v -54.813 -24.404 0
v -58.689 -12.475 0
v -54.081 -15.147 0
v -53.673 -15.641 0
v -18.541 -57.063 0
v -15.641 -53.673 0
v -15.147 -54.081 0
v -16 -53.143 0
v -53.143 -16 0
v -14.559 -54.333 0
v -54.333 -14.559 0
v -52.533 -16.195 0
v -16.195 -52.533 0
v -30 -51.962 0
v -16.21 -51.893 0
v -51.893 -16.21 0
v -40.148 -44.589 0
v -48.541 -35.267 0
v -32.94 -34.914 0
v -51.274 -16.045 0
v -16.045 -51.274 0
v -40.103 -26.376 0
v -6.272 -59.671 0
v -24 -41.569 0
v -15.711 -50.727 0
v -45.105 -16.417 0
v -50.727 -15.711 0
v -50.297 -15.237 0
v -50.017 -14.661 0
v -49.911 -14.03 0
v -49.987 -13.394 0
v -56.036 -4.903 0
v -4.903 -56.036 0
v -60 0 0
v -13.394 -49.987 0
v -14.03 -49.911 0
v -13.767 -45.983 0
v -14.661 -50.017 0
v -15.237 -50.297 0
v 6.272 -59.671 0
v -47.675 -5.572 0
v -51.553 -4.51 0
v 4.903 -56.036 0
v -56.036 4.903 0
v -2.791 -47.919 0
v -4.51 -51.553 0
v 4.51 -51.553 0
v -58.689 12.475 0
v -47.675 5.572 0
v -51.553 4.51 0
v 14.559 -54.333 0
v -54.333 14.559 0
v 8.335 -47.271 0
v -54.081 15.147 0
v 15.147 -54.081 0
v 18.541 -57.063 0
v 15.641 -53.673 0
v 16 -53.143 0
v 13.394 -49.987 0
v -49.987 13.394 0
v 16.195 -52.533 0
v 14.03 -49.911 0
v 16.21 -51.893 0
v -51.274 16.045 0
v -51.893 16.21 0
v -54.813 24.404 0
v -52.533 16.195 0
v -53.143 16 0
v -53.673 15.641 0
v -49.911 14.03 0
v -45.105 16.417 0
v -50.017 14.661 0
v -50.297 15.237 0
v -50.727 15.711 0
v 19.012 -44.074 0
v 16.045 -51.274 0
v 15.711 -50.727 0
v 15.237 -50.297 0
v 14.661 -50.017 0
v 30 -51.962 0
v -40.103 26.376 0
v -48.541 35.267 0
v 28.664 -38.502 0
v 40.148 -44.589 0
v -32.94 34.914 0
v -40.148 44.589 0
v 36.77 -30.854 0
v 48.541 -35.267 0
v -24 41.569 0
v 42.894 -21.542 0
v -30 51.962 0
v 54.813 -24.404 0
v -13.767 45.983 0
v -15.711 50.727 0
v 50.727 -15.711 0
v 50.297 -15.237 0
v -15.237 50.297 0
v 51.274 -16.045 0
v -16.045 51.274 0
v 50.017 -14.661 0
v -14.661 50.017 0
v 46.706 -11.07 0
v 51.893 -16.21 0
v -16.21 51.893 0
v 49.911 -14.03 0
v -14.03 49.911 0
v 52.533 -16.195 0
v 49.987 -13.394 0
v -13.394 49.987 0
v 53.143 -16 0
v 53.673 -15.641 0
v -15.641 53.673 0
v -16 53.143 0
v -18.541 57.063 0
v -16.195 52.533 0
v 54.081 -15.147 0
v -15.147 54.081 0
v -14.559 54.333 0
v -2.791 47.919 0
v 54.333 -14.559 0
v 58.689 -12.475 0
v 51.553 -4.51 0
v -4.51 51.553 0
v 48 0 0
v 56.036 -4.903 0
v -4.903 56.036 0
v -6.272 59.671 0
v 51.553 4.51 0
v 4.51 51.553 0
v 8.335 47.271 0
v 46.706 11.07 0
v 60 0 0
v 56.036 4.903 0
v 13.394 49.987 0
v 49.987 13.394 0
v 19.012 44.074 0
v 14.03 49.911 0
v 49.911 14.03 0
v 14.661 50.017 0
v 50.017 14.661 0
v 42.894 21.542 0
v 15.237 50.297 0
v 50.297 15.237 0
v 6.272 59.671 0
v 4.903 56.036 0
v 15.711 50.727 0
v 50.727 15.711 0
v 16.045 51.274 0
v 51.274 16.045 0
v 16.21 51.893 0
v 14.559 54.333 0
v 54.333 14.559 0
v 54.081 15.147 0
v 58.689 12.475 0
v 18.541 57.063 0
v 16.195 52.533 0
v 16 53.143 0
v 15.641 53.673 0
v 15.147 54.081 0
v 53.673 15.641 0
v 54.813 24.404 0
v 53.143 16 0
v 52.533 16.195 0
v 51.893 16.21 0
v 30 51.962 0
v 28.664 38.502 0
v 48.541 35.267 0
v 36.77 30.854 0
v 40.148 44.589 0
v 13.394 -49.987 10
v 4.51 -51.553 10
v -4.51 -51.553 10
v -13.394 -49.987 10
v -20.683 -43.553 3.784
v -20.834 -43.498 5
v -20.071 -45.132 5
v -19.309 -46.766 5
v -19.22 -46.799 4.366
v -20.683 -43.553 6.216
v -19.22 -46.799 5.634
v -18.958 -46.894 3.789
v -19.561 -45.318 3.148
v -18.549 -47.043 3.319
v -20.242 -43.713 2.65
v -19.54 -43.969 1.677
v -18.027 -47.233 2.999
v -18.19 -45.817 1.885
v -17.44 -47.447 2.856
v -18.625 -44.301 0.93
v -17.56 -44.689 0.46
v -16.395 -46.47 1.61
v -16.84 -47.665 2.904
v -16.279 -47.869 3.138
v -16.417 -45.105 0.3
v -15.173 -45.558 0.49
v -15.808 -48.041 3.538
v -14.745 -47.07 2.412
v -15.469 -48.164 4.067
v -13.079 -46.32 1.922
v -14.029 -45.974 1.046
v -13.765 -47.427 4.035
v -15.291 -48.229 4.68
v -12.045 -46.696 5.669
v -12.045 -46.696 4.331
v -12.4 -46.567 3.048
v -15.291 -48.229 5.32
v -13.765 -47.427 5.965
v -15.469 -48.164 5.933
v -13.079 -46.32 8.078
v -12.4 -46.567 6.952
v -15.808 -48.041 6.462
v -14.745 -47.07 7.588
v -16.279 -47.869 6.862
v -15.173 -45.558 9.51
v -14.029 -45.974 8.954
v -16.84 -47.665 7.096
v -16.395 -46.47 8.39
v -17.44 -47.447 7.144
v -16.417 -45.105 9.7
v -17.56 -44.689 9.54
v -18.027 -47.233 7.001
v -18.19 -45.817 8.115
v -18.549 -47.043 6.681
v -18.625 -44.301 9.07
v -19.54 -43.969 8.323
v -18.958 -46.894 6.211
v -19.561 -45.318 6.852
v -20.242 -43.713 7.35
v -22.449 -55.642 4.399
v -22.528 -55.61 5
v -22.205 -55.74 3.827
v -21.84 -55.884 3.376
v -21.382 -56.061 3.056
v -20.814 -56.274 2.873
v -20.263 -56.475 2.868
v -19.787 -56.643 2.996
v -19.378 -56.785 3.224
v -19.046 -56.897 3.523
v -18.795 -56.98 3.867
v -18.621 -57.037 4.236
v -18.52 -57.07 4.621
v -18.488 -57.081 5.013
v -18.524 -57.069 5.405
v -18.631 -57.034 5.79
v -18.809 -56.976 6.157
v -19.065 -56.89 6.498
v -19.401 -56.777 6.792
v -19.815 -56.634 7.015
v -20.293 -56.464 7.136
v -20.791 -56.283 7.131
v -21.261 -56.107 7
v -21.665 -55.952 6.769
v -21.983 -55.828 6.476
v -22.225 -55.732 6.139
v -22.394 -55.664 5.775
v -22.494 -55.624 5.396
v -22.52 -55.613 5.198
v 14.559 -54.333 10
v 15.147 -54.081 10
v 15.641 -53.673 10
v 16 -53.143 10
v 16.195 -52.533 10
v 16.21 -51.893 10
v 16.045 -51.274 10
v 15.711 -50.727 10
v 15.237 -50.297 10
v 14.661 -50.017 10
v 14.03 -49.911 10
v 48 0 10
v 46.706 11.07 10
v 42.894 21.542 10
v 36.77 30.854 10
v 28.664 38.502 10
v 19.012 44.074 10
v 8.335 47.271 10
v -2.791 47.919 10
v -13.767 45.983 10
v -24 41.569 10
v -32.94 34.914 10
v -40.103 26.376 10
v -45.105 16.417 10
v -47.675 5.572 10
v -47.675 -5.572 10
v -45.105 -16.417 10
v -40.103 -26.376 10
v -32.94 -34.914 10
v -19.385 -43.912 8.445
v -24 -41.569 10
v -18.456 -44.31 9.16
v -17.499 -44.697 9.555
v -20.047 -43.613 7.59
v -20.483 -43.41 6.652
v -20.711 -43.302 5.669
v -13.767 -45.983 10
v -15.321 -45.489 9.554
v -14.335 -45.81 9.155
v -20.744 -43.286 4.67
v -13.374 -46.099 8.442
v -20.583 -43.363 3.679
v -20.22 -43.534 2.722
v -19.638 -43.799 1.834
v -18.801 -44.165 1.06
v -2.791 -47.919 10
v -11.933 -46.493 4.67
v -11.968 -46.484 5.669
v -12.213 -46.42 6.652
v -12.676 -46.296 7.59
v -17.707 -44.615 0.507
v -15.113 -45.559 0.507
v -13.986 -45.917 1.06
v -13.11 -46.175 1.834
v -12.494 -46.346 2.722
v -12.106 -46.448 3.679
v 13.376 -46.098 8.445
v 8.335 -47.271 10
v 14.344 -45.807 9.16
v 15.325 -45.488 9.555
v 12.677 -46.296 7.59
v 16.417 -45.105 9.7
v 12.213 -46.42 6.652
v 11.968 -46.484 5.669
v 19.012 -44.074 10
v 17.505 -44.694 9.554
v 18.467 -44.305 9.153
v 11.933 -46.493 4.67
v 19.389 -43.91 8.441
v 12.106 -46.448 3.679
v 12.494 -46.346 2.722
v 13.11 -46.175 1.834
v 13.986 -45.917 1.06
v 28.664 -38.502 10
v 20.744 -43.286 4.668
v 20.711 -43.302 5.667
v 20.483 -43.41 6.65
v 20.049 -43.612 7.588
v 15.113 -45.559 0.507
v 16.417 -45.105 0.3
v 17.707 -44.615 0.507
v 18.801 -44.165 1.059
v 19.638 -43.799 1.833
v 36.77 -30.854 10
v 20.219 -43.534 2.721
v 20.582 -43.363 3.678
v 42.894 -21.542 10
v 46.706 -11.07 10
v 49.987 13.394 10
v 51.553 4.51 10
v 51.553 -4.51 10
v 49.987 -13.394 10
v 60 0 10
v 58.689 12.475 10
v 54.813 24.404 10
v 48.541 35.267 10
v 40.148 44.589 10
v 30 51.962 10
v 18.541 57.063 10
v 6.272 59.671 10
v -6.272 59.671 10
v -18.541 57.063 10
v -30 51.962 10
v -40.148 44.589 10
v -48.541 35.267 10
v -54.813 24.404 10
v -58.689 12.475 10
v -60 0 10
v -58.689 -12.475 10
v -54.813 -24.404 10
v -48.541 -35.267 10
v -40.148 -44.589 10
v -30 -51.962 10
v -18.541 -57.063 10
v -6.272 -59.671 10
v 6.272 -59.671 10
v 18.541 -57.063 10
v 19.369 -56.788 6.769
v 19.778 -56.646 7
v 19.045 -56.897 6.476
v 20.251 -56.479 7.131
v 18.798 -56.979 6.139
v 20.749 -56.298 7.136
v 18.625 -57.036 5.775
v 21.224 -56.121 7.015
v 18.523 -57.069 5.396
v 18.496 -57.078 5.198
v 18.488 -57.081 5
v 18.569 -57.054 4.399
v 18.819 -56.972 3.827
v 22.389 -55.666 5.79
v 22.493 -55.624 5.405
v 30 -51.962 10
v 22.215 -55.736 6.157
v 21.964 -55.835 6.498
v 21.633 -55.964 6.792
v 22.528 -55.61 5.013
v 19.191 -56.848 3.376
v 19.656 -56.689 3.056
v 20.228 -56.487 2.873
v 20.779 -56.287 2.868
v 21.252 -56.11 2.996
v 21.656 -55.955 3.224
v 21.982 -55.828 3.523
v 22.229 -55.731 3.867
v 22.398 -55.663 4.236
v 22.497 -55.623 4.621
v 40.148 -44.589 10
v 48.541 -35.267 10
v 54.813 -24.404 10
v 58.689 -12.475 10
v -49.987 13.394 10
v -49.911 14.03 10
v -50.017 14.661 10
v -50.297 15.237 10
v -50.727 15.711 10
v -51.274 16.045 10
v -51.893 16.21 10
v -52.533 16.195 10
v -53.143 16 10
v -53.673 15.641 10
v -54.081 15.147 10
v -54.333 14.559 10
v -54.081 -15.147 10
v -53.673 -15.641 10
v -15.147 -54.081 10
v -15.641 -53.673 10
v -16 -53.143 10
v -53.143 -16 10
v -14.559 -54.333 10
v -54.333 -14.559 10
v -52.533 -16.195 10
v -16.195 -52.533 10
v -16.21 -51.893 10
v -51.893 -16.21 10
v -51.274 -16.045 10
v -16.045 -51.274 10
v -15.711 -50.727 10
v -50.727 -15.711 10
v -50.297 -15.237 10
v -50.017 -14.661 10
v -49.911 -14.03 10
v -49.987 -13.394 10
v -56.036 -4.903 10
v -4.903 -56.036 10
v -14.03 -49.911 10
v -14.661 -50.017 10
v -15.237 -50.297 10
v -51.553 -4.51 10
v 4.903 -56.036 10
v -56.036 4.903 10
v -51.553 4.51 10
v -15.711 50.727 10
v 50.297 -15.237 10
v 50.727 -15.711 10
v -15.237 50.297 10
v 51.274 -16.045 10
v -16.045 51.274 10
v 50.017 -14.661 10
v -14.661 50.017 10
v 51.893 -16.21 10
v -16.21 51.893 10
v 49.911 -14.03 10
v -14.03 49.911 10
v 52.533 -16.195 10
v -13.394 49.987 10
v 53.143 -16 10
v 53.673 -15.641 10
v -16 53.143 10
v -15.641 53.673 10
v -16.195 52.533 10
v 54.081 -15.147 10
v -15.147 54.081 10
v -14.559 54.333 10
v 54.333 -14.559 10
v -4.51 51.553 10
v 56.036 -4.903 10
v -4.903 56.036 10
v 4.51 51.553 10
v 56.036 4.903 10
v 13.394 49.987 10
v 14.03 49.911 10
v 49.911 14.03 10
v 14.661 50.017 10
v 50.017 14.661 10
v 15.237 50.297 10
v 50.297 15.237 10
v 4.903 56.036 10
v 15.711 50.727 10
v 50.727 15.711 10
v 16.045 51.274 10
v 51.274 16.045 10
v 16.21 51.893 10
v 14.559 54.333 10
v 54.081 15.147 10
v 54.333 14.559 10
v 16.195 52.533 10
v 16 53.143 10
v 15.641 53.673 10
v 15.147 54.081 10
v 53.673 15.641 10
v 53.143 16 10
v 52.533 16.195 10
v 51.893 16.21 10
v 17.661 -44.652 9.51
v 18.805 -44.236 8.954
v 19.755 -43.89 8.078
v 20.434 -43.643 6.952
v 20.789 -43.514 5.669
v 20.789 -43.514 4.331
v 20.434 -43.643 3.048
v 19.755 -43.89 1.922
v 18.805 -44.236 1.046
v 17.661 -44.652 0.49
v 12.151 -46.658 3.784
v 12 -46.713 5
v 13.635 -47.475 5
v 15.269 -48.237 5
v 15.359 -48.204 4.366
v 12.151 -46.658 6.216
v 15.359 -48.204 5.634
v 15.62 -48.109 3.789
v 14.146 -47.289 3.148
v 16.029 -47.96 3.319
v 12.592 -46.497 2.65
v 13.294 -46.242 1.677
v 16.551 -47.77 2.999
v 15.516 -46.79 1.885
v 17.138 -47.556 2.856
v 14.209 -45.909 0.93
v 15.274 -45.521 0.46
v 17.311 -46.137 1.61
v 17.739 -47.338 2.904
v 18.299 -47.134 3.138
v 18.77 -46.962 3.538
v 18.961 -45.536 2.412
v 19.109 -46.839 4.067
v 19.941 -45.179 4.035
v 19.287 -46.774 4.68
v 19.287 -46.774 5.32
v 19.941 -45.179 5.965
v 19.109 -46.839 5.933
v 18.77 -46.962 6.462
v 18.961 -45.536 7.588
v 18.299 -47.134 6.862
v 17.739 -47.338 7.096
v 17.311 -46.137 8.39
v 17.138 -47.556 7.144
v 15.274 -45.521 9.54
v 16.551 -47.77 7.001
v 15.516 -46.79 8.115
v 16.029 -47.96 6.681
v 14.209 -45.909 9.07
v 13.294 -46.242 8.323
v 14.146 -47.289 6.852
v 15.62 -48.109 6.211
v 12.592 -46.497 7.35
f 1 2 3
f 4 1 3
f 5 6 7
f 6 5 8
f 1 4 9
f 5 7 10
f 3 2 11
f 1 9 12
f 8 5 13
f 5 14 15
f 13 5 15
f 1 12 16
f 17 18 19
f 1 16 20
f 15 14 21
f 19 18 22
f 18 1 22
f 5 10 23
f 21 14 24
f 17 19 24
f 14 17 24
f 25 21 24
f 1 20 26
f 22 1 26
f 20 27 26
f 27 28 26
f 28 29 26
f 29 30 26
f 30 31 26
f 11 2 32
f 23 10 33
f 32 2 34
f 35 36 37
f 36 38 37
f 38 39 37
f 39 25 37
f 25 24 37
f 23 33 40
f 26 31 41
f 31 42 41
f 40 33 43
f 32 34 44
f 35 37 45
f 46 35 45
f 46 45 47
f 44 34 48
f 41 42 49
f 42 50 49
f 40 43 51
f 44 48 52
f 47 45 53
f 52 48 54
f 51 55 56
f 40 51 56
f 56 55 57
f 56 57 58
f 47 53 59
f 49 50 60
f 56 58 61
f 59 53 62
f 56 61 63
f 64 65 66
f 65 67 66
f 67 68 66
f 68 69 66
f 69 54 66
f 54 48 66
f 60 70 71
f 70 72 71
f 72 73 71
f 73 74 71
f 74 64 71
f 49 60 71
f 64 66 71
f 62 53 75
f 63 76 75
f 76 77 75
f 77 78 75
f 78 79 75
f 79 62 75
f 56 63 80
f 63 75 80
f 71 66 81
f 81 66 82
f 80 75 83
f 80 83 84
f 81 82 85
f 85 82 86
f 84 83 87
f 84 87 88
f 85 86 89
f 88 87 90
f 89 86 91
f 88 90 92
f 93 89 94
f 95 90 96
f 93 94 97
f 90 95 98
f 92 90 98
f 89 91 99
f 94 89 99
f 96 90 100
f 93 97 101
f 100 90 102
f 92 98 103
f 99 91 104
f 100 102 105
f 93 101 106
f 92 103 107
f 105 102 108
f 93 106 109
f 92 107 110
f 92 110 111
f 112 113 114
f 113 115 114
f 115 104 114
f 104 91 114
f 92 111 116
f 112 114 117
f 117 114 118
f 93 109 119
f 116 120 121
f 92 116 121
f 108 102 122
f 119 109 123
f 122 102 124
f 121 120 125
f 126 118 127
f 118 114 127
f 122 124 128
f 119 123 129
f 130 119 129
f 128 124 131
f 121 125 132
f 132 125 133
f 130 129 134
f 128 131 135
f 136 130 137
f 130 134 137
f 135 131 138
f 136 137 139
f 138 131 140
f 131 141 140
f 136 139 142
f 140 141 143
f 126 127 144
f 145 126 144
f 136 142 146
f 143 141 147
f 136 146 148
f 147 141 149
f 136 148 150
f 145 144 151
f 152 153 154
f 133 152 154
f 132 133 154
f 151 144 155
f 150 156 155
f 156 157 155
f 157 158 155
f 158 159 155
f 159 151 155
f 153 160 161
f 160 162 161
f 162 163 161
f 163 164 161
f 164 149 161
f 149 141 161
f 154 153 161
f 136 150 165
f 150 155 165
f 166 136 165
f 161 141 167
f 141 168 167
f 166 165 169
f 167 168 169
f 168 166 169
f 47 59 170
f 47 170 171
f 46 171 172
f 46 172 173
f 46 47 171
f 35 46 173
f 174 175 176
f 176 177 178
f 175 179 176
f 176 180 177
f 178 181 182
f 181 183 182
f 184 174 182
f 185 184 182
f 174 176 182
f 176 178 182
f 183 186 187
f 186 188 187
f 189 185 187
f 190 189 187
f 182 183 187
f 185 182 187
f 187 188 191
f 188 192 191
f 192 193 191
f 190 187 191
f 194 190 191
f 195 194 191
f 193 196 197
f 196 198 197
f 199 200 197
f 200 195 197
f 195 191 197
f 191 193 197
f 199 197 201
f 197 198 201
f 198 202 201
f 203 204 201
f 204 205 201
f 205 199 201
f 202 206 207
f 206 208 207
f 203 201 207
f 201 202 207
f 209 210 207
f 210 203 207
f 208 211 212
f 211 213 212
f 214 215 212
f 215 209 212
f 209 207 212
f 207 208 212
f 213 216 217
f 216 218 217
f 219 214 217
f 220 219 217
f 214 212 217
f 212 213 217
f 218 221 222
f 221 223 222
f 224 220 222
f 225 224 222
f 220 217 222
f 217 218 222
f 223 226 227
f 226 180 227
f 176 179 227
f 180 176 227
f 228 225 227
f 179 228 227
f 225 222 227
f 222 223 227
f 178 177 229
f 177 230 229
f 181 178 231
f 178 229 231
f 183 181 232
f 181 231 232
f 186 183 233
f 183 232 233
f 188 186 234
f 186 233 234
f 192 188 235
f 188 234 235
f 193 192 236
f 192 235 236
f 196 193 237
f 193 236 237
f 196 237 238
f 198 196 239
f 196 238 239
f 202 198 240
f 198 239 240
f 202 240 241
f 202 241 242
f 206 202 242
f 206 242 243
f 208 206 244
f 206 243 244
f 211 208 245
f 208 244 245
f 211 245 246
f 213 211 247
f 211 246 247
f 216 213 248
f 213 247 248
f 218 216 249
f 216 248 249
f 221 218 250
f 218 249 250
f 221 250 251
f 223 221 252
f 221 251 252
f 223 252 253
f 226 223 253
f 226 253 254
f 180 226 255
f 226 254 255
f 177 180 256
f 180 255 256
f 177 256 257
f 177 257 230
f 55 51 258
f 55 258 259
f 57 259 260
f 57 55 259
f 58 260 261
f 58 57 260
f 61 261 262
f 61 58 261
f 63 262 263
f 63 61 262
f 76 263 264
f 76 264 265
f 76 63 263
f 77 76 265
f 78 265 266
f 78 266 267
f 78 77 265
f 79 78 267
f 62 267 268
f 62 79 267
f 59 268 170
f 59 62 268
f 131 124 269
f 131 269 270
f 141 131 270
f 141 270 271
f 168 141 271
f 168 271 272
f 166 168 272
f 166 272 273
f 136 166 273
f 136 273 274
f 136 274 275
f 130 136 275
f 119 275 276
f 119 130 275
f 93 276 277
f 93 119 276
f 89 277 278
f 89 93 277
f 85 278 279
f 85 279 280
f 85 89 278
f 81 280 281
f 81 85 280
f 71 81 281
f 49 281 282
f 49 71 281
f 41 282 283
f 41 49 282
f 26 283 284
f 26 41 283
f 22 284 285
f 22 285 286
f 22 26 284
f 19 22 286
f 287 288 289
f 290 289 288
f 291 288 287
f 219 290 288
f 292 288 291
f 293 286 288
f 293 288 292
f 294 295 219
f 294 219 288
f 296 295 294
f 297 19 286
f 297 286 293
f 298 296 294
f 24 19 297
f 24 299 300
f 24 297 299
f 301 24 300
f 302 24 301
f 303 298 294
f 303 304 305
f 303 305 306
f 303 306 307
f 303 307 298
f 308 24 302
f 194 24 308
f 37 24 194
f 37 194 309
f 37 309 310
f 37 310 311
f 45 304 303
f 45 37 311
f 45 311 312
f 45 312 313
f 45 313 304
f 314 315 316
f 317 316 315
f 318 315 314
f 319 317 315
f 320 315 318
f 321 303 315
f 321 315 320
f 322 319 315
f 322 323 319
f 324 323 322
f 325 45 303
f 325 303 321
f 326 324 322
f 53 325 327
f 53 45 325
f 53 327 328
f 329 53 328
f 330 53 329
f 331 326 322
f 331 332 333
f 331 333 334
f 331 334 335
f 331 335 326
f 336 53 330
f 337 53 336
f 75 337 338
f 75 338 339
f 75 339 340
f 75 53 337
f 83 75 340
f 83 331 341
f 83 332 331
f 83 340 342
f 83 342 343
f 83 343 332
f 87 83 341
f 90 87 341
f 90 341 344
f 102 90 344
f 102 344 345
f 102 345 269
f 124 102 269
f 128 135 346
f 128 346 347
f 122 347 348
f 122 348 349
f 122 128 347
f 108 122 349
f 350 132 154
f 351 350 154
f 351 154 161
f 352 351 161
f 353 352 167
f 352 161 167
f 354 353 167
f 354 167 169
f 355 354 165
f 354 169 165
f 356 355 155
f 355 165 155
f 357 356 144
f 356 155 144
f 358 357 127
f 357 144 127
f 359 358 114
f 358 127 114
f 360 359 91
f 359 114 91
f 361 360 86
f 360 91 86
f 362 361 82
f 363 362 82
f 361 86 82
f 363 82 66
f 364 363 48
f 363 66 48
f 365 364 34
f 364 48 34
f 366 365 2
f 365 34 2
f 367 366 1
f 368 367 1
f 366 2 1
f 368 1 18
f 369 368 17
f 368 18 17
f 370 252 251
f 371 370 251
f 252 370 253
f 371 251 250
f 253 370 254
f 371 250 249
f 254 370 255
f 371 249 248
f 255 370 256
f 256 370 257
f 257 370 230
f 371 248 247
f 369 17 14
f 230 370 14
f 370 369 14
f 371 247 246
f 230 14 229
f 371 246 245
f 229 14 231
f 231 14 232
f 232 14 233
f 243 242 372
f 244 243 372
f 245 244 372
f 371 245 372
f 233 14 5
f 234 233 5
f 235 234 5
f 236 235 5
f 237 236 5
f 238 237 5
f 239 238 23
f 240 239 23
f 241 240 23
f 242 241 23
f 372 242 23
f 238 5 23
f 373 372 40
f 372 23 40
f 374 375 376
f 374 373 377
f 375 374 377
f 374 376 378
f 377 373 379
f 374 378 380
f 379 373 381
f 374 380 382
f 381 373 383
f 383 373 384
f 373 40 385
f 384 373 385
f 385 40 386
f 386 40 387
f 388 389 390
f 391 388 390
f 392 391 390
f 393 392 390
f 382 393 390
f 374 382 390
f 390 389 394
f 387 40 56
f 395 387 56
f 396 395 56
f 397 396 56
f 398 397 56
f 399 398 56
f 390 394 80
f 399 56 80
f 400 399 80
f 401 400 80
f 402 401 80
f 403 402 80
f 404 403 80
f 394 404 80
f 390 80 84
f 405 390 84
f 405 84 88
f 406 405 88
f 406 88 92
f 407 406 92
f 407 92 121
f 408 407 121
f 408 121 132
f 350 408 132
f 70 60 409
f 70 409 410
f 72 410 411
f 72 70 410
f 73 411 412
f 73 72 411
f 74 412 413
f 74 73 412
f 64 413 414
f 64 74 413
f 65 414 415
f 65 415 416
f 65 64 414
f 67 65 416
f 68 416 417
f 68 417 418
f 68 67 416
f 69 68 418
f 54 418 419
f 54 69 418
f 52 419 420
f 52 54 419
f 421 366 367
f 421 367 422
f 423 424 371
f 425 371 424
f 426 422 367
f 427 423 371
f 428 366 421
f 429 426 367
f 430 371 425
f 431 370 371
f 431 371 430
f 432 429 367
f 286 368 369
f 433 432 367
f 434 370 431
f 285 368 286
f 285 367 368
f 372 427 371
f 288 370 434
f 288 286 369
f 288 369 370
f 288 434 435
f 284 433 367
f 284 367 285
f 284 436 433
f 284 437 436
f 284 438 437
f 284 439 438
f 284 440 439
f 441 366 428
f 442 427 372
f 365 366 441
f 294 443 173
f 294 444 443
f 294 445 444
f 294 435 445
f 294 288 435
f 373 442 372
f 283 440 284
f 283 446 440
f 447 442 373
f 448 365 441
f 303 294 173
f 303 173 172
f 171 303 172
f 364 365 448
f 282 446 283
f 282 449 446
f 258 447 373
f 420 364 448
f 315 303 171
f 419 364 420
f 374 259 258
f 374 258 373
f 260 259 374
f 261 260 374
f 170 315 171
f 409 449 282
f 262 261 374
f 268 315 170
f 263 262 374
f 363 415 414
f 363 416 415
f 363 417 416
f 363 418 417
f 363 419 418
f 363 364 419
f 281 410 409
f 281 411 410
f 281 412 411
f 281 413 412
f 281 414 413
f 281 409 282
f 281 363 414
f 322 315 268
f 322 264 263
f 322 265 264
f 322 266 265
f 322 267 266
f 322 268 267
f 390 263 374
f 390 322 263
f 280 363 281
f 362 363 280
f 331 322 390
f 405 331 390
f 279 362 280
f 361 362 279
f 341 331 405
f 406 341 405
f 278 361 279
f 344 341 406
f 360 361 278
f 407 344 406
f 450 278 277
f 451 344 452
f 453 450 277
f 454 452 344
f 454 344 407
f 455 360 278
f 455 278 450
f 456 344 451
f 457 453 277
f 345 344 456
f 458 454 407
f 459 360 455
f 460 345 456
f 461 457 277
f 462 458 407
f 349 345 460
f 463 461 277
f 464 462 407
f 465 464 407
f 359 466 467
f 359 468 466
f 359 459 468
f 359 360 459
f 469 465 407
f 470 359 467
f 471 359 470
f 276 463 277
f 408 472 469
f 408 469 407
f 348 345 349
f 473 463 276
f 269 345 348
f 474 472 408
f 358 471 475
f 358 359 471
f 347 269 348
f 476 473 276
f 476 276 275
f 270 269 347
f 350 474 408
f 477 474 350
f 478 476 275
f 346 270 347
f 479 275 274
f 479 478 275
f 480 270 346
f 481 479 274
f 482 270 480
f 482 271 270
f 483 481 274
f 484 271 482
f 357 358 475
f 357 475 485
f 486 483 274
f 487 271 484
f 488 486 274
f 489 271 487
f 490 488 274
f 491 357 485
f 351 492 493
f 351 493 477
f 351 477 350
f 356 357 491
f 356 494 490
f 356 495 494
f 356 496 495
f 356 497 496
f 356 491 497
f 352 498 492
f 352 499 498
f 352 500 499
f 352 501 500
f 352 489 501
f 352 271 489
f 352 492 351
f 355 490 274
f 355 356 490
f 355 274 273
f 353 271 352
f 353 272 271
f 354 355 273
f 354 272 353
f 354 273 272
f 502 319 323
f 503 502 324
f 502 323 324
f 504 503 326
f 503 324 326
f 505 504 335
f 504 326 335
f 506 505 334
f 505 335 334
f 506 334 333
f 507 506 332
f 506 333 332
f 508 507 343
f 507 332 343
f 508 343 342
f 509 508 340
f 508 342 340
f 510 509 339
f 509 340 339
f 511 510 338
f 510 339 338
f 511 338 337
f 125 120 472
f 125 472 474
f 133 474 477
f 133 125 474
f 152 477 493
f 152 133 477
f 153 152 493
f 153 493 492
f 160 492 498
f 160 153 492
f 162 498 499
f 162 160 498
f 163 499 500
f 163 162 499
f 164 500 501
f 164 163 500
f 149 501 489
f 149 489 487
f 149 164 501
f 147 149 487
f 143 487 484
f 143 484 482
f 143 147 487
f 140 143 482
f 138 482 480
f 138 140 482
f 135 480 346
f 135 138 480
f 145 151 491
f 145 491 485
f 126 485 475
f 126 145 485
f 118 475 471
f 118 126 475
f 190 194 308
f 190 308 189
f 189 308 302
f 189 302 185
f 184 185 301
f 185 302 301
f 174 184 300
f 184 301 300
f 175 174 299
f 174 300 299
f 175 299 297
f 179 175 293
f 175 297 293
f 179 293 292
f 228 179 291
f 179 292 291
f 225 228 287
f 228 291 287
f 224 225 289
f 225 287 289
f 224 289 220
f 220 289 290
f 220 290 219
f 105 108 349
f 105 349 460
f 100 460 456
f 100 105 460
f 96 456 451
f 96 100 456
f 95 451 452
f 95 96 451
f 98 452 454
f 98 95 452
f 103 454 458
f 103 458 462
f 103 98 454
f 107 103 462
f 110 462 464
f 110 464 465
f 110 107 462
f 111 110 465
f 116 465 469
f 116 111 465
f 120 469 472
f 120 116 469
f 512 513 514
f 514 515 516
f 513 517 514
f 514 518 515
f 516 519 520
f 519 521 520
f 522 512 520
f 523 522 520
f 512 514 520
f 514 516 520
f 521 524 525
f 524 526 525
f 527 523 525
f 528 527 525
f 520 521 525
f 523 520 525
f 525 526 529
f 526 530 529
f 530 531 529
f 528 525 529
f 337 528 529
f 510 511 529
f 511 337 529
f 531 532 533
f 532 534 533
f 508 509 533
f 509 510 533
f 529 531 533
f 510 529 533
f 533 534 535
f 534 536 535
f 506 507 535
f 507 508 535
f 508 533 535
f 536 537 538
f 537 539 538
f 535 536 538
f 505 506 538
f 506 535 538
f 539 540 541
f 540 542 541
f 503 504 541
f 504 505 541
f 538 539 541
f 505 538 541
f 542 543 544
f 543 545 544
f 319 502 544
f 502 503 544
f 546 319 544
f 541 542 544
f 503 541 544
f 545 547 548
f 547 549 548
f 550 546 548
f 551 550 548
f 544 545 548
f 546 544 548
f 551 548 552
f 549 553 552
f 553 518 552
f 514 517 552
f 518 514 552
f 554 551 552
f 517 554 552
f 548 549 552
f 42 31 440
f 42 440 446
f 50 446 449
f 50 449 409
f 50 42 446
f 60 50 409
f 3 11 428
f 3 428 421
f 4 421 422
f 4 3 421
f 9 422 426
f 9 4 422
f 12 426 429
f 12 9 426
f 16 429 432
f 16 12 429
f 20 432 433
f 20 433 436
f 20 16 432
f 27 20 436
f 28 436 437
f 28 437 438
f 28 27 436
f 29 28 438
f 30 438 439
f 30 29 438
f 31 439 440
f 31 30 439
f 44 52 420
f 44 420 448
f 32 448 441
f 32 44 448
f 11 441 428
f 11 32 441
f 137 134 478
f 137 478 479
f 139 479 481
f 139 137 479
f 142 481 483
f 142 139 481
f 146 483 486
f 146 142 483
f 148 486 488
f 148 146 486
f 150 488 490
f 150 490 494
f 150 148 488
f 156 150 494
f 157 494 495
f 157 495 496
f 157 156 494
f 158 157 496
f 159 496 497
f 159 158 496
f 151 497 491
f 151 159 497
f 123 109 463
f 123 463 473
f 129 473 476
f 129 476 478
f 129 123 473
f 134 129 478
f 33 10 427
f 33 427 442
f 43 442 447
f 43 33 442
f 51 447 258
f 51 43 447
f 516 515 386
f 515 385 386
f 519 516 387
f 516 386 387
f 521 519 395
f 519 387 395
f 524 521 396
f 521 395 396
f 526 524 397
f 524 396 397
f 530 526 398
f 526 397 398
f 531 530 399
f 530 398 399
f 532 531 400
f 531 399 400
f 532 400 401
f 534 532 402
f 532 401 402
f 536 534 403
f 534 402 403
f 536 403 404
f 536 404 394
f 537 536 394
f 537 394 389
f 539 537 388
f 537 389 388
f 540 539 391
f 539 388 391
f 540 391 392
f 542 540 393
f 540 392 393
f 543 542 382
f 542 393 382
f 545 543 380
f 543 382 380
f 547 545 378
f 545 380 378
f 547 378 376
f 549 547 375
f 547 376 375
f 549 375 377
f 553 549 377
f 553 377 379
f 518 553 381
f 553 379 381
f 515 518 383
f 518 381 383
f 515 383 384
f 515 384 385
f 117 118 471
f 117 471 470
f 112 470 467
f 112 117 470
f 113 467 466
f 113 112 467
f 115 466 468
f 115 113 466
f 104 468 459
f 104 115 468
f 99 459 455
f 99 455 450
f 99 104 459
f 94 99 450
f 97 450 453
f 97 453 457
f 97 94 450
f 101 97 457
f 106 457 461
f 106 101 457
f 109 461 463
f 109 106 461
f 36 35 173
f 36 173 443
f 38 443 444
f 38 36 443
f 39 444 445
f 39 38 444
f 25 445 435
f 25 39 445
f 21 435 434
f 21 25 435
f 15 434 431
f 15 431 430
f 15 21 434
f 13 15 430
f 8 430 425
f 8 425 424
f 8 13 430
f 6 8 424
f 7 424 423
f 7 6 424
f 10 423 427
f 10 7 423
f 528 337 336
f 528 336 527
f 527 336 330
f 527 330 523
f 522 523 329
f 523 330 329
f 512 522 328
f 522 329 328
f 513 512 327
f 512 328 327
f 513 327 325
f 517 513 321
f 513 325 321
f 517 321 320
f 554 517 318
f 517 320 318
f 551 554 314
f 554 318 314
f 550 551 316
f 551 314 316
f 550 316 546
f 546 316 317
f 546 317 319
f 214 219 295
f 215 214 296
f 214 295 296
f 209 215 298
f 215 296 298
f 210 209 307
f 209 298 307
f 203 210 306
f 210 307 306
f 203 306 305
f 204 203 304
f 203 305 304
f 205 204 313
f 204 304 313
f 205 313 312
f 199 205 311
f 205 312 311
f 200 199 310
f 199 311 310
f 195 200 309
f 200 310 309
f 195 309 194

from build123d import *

# Parameters (mm, degrees)
SCHIZZO2_R                                       = 60
SCHIZZO2_R_2                                     = 48
ESTRUSIONE_ESTRUSIONE1_DEPTH                     = 10
FORO_SVASATO_PER_VITE_M4_1_D                     = 4.3
FORO_SVASATO_PER_VITE_M4_1_DEPTH                 = 28.902765847
FORO_SVASATO_PER_VITE_M4_1_CSINK_D               = 9.4
FORO_SVASATO_PER_VITE_M4_1_CSINK_ANGLE           = 90
FORO_SVASATO_PER_VITE_M4_1_ON_FACE_2_D           = 4.3
FORO_SVASATO_PER_VITE_M4_1_ON_FACE_2_DEPTH       = 28.902765847
FORO_SVASATO_PER_VITE_M4_1_ON_FACE_2_CSINK_D     = 9.4
FORO_SVASATO_PER_VITE_M4_1_ON_FACE_2_CSINK_ANGLE = 90


with BuildPart() as part:
    # Schizzo2 → Estrusione-Estrusione1 (new body)
    with BuildSketch(Plane.XY):
        Circle(SCHIZZO2_R)
        Circle(SCHIZZO2_R_2, mode=Mode.SUBTRACT)
        with BuildLine():
            ThreePointArc((-54.333327729, 14.558571287), (-56.25, 0), (-54.333327729, -14.558571287))
            ThreePointArc((-54.333327729, -14.558571287), (-51.577651768, -16.149561545), (-49.98666151, -13.393885584))
            ThreePointArc((-49.98666151, -13.393885584), (-51.75, 0), (-49.98666151, 13.393885584))
            ThreePointArc((-49.98666151, 13.393885584), (-51.577651768, 16.149561545), (-54.333327729, 14.558571287))
        make_face(mode=Mode.SUBTRACT)
        with BuildLine():
            ThreePointArc((-13.393885584, -49.98666151), (-16.149561545, -51.577651768), (-14.558571287, -54.333327729))
            ThreePointArc((-14.558571287, -54.333327729), (0, -56.25), (14.558571287, -54.333327729))
            ThreePointArc((14.558571287, -54.333327729), (16.149561545, -51.577651768), (13.393885584, -49.98666151))
            ThreePointArc((13.393885584, -49.98666151), (0, -51.75), (-13.393885584, -49.98666151))
        make_face(mode=Mode.SUBTRACT)
        with BuildLine():
            ThreePointArc((13.393885584, 49.98666151), (16.149561545, 51.577651768), (14.558571287, 54.333327729))
            ThreePointArc((14.558571287, 54.333327729), (0, 56.25), (-14.558571287, 54.333327729))
            ThreePointArc((-14.558571287, 54.333327729), (-16.149561545, 51.577651768), (-13.393885584, 49.98666151))
            ThreePointArc((-13.393885584, 49.98666151), (0, 51.75), (13.393885584, 49.98666151))
        make_face(mode=Mode.SUBTRACT)
        with BuildLine():
            ThreePointArc((54.333327729, 14.558571287), (51.577651768, 16.149561545), (49.98666151, 13.393885584))
            ThreePointArc((49.98666151, 13.393885584), (51.75, 0), (49.98666151, -13.393885584))
            ThreePointArc((49.98666151, -13.393885584), (51.577651768, -16.149561545), (54.333327729, -14.558571287))
            ThreePointArc((54.333327729, -14.558571287), (56.25, 0), (54.333327729, 14.558571287))
        make_face(mode=Mode.SUBTRACT)
    extrude(amount=ESTRUSIONE_ESTRUSIONE1_DEPTH)

    # Foro svasato per Vite M4-1
    with Locations(Plane(origin=(-16.41696688, -45.105245798, 5), x_dir=(0.939692620786, -0.342020143326, 0), z_dir=(0.342020143326, 0.939692620786, 0))):
        with Locations((0, 0)):
            CounterSinkHole(FORO_SVASATO_PER_VITE_M4_1_D / 2, FORO_SVASATO_PER_VITE_M4_1_CSINK_D / 2, depth=FORO_SVASATO_PER_VITE_M4_1_DEPTH, counter_sink_angle=FORO_SVASATO_PER_VITE_M4_1_CSINK_ANGLE)

    # Foro svasato per Vite M4-1 on face 2
    with Locations(Plane(origin=(16.41696688, -45.105245798, 5), x_dir=(0.939692711209, 0.342019894889, 0), z_dir=(-0.342019894889, 0.939692711209, 0))):
        with Locations((0, 0)):
            CounterSinkHole(FORO_SVASATO_PER_VITE_M4_1_ON_FACE_2_D / 2, FORO_SVASATO_PER_VITE_M4_1_ON_FACE_2_CSINK_D / 2, depth=FORO_SVASATO_PER_VITE_M4_1_ON_FACE_2_DEPTH, counter_sink_angle=FORO_SVASATO_PER_VITE_M4_1_ON_FACE_2_CSINK_ANGLE)


solid = part.part
